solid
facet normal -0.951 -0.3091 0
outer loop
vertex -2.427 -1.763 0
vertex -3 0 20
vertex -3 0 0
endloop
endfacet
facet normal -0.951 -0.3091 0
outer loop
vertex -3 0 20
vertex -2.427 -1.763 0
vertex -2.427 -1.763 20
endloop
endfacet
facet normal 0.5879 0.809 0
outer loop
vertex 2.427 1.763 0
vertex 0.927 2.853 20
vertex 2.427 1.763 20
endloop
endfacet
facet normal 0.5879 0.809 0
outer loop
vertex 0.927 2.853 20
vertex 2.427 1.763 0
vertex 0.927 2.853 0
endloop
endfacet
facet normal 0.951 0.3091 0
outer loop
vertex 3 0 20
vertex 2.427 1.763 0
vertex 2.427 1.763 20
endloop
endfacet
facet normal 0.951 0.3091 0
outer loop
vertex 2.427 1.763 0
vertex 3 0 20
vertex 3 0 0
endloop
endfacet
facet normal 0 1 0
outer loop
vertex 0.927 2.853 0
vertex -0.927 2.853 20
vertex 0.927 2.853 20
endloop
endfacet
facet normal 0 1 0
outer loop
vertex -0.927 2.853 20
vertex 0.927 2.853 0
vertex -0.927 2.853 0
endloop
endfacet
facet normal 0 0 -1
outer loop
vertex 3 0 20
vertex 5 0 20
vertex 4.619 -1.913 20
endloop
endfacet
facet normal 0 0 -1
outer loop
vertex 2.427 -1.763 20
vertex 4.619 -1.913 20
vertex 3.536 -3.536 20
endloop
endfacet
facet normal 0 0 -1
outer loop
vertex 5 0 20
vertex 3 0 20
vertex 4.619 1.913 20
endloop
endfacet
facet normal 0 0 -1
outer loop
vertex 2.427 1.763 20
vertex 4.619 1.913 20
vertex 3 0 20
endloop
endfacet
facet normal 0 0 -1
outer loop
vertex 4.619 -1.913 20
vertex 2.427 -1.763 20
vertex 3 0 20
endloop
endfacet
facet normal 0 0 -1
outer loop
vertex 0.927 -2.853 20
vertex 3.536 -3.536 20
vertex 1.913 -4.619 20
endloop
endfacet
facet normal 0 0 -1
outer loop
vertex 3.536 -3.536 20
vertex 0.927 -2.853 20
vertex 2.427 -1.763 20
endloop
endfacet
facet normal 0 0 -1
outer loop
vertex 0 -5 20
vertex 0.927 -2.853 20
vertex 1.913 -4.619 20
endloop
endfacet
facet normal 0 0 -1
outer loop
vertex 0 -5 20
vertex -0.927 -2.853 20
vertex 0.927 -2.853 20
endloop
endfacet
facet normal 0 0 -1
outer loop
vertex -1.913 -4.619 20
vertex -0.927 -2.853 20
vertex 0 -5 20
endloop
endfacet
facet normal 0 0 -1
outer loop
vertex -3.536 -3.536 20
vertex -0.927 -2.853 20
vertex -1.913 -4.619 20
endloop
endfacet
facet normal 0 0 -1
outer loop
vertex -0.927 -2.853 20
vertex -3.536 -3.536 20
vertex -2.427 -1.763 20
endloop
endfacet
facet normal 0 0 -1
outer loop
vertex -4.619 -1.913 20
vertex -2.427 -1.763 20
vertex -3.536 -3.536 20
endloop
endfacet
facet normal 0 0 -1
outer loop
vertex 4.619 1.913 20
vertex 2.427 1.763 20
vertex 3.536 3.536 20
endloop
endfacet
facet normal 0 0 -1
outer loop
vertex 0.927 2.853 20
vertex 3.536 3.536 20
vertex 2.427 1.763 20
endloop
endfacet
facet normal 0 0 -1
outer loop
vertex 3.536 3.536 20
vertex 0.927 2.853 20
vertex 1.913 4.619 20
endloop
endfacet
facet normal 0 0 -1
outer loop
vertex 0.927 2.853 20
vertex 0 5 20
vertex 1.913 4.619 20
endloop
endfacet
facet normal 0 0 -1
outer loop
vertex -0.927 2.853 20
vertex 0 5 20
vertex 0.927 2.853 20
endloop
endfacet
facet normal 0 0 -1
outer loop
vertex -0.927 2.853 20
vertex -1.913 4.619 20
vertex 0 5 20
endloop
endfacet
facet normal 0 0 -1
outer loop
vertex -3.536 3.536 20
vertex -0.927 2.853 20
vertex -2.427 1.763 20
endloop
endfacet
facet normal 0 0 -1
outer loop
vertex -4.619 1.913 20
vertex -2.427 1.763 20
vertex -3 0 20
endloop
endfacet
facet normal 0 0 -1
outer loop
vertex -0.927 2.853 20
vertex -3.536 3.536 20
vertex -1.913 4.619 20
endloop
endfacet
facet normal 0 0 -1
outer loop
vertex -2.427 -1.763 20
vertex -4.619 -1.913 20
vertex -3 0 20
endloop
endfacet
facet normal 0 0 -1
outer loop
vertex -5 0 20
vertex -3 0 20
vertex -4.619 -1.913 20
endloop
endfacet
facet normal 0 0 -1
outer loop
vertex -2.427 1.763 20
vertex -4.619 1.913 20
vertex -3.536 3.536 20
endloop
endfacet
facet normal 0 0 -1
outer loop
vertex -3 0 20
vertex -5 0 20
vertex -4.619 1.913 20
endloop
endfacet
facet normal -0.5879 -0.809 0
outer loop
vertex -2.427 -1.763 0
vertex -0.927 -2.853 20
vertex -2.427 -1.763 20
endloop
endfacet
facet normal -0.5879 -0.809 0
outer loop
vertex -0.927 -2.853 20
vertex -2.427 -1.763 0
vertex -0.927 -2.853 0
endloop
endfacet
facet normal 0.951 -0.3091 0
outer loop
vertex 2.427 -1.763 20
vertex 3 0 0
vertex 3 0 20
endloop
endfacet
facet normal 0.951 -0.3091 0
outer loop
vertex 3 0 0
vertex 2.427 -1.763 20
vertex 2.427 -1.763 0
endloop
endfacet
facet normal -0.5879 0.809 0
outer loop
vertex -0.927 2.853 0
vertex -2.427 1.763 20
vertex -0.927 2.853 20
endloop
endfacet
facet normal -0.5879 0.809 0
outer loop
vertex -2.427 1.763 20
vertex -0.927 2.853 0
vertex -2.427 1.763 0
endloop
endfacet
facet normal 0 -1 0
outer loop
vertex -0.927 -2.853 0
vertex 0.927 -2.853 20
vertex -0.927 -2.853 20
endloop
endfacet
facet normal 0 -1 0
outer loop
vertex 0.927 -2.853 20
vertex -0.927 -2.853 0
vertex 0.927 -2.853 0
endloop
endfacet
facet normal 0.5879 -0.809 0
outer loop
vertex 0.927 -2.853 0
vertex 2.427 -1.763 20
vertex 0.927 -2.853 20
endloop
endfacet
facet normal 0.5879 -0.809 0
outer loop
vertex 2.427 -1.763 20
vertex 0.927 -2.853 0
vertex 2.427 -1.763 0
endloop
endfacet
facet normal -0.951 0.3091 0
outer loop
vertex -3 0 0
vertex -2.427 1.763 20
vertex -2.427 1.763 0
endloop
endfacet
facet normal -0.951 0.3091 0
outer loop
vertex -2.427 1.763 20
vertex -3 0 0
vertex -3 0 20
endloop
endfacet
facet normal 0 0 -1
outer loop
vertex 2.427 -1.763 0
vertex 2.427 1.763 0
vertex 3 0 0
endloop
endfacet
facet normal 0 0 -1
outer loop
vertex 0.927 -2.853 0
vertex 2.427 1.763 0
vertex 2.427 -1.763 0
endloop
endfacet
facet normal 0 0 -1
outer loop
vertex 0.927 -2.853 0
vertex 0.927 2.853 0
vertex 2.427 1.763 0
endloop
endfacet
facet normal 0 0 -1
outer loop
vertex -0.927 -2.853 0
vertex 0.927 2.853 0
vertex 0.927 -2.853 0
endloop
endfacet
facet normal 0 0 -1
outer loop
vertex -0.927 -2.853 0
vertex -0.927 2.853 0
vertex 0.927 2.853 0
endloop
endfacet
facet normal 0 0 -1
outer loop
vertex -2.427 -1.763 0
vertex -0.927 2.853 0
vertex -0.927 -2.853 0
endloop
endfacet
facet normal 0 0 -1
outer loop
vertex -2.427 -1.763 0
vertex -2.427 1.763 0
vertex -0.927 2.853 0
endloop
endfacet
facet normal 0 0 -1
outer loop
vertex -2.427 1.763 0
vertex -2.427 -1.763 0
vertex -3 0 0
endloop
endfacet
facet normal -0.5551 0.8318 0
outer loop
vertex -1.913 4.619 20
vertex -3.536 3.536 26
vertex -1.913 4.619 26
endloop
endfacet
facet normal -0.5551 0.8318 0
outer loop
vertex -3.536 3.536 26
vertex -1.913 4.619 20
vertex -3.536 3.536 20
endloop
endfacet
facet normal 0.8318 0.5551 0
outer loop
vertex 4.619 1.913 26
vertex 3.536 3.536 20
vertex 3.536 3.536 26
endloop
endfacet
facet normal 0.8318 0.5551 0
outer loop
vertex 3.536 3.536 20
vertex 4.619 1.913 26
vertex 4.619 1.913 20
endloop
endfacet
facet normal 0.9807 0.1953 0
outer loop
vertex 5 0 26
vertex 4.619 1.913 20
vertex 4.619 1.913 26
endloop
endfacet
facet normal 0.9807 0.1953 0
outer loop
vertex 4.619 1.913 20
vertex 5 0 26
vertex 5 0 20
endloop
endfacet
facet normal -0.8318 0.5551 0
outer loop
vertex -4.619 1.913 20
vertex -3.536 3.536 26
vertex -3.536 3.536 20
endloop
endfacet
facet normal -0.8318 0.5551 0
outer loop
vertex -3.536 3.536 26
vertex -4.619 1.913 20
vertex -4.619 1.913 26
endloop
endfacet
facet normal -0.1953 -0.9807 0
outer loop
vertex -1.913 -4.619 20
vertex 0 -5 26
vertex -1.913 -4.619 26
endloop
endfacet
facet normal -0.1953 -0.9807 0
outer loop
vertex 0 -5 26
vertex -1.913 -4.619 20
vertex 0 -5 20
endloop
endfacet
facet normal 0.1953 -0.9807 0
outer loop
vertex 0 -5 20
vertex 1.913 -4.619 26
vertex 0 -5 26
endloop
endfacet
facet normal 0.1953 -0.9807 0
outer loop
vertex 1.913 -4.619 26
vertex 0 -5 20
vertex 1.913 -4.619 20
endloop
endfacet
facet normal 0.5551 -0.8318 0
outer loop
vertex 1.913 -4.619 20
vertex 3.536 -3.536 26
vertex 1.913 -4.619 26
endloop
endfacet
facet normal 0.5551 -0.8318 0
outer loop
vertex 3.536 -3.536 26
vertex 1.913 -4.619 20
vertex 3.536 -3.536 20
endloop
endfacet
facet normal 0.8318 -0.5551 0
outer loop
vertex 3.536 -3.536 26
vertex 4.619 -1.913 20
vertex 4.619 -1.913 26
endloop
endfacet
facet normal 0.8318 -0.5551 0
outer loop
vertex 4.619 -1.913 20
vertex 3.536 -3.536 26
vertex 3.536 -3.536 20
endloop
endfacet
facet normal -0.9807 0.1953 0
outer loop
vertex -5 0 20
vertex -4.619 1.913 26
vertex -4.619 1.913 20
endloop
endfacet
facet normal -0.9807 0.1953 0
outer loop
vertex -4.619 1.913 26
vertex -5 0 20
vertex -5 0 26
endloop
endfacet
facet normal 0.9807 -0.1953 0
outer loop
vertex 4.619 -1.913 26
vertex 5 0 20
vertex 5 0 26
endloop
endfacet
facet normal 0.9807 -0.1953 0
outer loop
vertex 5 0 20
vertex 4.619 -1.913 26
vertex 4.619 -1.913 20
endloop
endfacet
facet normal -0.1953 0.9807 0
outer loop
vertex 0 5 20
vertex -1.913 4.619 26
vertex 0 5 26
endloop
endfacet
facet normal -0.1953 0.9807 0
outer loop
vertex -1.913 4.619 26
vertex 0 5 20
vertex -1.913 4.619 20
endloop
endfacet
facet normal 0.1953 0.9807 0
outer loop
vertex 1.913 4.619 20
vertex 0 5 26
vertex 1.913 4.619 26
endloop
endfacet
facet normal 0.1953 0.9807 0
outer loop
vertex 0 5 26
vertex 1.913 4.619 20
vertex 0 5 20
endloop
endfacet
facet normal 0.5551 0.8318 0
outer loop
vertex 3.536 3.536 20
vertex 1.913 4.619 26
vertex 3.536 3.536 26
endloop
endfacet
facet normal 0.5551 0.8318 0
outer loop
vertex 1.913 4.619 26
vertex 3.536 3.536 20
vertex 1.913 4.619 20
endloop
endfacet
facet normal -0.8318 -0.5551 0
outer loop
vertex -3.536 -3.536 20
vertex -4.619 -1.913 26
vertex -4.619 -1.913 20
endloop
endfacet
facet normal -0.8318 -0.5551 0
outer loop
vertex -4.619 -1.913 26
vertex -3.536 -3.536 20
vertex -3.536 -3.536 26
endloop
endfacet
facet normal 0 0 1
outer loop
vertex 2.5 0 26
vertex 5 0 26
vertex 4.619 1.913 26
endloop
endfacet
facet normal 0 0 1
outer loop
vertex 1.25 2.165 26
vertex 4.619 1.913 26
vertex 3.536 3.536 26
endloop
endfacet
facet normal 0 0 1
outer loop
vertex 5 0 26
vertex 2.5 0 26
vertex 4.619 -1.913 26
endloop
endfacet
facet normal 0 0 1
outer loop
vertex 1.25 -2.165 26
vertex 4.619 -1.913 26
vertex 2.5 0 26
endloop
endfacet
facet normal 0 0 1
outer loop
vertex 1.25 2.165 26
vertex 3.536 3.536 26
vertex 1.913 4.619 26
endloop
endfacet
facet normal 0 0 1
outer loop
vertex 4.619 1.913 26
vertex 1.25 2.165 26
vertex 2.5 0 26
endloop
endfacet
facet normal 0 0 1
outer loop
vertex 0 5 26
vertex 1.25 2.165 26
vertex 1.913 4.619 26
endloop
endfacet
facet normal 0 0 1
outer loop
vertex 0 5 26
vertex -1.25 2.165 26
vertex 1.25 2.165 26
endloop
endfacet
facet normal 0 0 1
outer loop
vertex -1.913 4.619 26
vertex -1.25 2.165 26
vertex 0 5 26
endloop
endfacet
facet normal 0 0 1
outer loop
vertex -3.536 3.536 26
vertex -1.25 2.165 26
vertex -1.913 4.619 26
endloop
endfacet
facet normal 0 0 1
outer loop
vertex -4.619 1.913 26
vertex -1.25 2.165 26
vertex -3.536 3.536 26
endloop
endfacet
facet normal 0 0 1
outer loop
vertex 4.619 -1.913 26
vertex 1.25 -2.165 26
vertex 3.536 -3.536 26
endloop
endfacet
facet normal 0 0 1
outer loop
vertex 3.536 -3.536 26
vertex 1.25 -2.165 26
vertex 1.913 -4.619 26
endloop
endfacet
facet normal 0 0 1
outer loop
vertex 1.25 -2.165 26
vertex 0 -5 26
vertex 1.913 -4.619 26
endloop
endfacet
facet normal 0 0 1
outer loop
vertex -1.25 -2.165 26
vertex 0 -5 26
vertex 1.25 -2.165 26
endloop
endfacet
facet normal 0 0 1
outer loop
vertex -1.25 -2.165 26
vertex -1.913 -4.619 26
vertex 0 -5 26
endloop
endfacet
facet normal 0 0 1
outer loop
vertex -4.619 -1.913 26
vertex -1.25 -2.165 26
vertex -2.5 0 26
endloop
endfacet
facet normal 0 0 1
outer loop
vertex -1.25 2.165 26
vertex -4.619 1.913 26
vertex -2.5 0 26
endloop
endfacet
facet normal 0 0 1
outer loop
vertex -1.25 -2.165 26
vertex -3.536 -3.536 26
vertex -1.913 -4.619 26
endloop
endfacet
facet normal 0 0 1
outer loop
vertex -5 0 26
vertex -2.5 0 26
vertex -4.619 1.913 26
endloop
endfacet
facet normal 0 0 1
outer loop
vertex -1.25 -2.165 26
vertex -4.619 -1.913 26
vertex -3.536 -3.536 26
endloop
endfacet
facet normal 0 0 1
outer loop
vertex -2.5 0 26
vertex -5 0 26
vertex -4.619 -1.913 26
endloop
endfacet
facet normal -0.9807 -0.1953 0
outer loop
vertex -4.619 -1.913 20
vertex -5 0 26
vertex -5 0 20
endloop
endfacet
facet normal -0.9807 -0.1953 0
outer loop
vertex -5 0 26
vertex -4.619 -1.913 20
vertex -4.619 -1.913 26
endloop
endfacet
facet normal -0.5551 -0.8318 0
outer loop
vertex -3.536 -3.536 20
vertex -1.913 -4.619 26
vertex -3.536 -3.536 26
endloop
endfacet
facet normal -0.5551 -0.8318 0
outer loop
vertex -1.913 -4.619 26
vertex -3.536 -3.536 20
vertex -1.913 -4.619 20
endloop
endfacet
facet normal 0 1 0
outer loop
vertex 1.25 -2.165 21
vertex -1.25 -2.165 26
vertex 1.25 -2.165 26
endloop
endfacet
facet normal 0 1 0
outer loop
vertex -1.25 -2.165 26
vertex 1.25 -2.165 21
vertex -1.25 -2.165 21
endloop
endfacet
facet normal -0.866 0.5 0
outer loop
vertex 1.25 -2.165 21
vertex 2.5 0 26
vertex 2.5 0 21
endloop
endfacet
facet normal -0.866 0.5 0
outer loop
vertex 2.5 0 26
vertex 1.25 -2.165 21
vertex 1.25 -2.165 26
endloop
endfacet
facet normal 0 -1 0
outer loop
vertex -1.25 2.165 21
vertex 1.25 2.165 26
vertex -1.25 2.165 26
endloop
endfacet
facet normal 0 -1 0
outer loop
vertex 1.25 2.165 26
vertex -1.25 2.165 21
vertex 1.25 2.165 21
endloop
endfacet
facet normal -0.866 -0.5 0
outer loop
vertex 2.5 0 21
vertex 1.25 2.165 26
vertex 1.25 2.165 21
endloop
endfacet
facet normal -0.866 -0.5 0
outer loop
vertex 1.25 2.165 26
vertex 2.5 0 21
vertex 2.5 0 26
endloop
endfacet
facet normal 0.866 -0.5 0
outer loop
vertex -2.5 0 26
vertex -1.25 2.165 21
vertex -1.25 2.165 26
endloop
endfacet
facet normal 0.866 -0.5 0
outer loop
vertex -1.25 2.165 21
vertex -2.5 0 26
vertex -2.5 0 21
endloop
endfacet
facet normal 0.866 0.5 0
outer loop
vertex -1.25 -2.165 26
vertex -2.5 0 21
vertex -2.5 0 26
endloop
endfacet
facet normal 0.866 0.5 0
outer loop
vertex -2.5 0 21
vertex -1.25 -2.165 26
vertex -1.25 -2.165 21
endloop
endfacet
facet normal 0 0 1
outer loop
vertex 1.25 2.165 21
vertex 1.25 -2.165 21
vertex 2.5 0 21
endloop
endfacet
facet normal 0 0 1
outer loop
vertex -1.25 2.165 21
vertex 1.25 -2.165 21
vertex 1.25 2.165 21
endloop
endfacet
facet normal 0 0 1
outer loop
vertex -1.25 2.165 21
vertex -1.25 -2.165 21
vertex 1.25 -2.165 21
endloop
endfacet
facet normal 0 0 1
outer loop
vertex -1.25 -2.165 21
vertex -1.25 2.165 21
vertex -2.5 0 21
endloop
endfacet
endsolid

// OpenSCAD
// M6 capscrew
shank_dia = 6.0;
head_dia = 10.0;
head_h = 6.0;
hex_dia = 5;
hex_h = 5;

module M6_capscrew(len) {
    color("grey") difference() {
        union() {
            cylinder(d=shank_dia, h=len);
            translate([0,0,len]) cylinder(d=head_dia, h=head_h);
        }
        translate([0,0,len+head_h-hex_h]) cylinder(d=hex_dia, h=hex_h,$fn=6);
    }
}
           
M6_capscrew(20);
